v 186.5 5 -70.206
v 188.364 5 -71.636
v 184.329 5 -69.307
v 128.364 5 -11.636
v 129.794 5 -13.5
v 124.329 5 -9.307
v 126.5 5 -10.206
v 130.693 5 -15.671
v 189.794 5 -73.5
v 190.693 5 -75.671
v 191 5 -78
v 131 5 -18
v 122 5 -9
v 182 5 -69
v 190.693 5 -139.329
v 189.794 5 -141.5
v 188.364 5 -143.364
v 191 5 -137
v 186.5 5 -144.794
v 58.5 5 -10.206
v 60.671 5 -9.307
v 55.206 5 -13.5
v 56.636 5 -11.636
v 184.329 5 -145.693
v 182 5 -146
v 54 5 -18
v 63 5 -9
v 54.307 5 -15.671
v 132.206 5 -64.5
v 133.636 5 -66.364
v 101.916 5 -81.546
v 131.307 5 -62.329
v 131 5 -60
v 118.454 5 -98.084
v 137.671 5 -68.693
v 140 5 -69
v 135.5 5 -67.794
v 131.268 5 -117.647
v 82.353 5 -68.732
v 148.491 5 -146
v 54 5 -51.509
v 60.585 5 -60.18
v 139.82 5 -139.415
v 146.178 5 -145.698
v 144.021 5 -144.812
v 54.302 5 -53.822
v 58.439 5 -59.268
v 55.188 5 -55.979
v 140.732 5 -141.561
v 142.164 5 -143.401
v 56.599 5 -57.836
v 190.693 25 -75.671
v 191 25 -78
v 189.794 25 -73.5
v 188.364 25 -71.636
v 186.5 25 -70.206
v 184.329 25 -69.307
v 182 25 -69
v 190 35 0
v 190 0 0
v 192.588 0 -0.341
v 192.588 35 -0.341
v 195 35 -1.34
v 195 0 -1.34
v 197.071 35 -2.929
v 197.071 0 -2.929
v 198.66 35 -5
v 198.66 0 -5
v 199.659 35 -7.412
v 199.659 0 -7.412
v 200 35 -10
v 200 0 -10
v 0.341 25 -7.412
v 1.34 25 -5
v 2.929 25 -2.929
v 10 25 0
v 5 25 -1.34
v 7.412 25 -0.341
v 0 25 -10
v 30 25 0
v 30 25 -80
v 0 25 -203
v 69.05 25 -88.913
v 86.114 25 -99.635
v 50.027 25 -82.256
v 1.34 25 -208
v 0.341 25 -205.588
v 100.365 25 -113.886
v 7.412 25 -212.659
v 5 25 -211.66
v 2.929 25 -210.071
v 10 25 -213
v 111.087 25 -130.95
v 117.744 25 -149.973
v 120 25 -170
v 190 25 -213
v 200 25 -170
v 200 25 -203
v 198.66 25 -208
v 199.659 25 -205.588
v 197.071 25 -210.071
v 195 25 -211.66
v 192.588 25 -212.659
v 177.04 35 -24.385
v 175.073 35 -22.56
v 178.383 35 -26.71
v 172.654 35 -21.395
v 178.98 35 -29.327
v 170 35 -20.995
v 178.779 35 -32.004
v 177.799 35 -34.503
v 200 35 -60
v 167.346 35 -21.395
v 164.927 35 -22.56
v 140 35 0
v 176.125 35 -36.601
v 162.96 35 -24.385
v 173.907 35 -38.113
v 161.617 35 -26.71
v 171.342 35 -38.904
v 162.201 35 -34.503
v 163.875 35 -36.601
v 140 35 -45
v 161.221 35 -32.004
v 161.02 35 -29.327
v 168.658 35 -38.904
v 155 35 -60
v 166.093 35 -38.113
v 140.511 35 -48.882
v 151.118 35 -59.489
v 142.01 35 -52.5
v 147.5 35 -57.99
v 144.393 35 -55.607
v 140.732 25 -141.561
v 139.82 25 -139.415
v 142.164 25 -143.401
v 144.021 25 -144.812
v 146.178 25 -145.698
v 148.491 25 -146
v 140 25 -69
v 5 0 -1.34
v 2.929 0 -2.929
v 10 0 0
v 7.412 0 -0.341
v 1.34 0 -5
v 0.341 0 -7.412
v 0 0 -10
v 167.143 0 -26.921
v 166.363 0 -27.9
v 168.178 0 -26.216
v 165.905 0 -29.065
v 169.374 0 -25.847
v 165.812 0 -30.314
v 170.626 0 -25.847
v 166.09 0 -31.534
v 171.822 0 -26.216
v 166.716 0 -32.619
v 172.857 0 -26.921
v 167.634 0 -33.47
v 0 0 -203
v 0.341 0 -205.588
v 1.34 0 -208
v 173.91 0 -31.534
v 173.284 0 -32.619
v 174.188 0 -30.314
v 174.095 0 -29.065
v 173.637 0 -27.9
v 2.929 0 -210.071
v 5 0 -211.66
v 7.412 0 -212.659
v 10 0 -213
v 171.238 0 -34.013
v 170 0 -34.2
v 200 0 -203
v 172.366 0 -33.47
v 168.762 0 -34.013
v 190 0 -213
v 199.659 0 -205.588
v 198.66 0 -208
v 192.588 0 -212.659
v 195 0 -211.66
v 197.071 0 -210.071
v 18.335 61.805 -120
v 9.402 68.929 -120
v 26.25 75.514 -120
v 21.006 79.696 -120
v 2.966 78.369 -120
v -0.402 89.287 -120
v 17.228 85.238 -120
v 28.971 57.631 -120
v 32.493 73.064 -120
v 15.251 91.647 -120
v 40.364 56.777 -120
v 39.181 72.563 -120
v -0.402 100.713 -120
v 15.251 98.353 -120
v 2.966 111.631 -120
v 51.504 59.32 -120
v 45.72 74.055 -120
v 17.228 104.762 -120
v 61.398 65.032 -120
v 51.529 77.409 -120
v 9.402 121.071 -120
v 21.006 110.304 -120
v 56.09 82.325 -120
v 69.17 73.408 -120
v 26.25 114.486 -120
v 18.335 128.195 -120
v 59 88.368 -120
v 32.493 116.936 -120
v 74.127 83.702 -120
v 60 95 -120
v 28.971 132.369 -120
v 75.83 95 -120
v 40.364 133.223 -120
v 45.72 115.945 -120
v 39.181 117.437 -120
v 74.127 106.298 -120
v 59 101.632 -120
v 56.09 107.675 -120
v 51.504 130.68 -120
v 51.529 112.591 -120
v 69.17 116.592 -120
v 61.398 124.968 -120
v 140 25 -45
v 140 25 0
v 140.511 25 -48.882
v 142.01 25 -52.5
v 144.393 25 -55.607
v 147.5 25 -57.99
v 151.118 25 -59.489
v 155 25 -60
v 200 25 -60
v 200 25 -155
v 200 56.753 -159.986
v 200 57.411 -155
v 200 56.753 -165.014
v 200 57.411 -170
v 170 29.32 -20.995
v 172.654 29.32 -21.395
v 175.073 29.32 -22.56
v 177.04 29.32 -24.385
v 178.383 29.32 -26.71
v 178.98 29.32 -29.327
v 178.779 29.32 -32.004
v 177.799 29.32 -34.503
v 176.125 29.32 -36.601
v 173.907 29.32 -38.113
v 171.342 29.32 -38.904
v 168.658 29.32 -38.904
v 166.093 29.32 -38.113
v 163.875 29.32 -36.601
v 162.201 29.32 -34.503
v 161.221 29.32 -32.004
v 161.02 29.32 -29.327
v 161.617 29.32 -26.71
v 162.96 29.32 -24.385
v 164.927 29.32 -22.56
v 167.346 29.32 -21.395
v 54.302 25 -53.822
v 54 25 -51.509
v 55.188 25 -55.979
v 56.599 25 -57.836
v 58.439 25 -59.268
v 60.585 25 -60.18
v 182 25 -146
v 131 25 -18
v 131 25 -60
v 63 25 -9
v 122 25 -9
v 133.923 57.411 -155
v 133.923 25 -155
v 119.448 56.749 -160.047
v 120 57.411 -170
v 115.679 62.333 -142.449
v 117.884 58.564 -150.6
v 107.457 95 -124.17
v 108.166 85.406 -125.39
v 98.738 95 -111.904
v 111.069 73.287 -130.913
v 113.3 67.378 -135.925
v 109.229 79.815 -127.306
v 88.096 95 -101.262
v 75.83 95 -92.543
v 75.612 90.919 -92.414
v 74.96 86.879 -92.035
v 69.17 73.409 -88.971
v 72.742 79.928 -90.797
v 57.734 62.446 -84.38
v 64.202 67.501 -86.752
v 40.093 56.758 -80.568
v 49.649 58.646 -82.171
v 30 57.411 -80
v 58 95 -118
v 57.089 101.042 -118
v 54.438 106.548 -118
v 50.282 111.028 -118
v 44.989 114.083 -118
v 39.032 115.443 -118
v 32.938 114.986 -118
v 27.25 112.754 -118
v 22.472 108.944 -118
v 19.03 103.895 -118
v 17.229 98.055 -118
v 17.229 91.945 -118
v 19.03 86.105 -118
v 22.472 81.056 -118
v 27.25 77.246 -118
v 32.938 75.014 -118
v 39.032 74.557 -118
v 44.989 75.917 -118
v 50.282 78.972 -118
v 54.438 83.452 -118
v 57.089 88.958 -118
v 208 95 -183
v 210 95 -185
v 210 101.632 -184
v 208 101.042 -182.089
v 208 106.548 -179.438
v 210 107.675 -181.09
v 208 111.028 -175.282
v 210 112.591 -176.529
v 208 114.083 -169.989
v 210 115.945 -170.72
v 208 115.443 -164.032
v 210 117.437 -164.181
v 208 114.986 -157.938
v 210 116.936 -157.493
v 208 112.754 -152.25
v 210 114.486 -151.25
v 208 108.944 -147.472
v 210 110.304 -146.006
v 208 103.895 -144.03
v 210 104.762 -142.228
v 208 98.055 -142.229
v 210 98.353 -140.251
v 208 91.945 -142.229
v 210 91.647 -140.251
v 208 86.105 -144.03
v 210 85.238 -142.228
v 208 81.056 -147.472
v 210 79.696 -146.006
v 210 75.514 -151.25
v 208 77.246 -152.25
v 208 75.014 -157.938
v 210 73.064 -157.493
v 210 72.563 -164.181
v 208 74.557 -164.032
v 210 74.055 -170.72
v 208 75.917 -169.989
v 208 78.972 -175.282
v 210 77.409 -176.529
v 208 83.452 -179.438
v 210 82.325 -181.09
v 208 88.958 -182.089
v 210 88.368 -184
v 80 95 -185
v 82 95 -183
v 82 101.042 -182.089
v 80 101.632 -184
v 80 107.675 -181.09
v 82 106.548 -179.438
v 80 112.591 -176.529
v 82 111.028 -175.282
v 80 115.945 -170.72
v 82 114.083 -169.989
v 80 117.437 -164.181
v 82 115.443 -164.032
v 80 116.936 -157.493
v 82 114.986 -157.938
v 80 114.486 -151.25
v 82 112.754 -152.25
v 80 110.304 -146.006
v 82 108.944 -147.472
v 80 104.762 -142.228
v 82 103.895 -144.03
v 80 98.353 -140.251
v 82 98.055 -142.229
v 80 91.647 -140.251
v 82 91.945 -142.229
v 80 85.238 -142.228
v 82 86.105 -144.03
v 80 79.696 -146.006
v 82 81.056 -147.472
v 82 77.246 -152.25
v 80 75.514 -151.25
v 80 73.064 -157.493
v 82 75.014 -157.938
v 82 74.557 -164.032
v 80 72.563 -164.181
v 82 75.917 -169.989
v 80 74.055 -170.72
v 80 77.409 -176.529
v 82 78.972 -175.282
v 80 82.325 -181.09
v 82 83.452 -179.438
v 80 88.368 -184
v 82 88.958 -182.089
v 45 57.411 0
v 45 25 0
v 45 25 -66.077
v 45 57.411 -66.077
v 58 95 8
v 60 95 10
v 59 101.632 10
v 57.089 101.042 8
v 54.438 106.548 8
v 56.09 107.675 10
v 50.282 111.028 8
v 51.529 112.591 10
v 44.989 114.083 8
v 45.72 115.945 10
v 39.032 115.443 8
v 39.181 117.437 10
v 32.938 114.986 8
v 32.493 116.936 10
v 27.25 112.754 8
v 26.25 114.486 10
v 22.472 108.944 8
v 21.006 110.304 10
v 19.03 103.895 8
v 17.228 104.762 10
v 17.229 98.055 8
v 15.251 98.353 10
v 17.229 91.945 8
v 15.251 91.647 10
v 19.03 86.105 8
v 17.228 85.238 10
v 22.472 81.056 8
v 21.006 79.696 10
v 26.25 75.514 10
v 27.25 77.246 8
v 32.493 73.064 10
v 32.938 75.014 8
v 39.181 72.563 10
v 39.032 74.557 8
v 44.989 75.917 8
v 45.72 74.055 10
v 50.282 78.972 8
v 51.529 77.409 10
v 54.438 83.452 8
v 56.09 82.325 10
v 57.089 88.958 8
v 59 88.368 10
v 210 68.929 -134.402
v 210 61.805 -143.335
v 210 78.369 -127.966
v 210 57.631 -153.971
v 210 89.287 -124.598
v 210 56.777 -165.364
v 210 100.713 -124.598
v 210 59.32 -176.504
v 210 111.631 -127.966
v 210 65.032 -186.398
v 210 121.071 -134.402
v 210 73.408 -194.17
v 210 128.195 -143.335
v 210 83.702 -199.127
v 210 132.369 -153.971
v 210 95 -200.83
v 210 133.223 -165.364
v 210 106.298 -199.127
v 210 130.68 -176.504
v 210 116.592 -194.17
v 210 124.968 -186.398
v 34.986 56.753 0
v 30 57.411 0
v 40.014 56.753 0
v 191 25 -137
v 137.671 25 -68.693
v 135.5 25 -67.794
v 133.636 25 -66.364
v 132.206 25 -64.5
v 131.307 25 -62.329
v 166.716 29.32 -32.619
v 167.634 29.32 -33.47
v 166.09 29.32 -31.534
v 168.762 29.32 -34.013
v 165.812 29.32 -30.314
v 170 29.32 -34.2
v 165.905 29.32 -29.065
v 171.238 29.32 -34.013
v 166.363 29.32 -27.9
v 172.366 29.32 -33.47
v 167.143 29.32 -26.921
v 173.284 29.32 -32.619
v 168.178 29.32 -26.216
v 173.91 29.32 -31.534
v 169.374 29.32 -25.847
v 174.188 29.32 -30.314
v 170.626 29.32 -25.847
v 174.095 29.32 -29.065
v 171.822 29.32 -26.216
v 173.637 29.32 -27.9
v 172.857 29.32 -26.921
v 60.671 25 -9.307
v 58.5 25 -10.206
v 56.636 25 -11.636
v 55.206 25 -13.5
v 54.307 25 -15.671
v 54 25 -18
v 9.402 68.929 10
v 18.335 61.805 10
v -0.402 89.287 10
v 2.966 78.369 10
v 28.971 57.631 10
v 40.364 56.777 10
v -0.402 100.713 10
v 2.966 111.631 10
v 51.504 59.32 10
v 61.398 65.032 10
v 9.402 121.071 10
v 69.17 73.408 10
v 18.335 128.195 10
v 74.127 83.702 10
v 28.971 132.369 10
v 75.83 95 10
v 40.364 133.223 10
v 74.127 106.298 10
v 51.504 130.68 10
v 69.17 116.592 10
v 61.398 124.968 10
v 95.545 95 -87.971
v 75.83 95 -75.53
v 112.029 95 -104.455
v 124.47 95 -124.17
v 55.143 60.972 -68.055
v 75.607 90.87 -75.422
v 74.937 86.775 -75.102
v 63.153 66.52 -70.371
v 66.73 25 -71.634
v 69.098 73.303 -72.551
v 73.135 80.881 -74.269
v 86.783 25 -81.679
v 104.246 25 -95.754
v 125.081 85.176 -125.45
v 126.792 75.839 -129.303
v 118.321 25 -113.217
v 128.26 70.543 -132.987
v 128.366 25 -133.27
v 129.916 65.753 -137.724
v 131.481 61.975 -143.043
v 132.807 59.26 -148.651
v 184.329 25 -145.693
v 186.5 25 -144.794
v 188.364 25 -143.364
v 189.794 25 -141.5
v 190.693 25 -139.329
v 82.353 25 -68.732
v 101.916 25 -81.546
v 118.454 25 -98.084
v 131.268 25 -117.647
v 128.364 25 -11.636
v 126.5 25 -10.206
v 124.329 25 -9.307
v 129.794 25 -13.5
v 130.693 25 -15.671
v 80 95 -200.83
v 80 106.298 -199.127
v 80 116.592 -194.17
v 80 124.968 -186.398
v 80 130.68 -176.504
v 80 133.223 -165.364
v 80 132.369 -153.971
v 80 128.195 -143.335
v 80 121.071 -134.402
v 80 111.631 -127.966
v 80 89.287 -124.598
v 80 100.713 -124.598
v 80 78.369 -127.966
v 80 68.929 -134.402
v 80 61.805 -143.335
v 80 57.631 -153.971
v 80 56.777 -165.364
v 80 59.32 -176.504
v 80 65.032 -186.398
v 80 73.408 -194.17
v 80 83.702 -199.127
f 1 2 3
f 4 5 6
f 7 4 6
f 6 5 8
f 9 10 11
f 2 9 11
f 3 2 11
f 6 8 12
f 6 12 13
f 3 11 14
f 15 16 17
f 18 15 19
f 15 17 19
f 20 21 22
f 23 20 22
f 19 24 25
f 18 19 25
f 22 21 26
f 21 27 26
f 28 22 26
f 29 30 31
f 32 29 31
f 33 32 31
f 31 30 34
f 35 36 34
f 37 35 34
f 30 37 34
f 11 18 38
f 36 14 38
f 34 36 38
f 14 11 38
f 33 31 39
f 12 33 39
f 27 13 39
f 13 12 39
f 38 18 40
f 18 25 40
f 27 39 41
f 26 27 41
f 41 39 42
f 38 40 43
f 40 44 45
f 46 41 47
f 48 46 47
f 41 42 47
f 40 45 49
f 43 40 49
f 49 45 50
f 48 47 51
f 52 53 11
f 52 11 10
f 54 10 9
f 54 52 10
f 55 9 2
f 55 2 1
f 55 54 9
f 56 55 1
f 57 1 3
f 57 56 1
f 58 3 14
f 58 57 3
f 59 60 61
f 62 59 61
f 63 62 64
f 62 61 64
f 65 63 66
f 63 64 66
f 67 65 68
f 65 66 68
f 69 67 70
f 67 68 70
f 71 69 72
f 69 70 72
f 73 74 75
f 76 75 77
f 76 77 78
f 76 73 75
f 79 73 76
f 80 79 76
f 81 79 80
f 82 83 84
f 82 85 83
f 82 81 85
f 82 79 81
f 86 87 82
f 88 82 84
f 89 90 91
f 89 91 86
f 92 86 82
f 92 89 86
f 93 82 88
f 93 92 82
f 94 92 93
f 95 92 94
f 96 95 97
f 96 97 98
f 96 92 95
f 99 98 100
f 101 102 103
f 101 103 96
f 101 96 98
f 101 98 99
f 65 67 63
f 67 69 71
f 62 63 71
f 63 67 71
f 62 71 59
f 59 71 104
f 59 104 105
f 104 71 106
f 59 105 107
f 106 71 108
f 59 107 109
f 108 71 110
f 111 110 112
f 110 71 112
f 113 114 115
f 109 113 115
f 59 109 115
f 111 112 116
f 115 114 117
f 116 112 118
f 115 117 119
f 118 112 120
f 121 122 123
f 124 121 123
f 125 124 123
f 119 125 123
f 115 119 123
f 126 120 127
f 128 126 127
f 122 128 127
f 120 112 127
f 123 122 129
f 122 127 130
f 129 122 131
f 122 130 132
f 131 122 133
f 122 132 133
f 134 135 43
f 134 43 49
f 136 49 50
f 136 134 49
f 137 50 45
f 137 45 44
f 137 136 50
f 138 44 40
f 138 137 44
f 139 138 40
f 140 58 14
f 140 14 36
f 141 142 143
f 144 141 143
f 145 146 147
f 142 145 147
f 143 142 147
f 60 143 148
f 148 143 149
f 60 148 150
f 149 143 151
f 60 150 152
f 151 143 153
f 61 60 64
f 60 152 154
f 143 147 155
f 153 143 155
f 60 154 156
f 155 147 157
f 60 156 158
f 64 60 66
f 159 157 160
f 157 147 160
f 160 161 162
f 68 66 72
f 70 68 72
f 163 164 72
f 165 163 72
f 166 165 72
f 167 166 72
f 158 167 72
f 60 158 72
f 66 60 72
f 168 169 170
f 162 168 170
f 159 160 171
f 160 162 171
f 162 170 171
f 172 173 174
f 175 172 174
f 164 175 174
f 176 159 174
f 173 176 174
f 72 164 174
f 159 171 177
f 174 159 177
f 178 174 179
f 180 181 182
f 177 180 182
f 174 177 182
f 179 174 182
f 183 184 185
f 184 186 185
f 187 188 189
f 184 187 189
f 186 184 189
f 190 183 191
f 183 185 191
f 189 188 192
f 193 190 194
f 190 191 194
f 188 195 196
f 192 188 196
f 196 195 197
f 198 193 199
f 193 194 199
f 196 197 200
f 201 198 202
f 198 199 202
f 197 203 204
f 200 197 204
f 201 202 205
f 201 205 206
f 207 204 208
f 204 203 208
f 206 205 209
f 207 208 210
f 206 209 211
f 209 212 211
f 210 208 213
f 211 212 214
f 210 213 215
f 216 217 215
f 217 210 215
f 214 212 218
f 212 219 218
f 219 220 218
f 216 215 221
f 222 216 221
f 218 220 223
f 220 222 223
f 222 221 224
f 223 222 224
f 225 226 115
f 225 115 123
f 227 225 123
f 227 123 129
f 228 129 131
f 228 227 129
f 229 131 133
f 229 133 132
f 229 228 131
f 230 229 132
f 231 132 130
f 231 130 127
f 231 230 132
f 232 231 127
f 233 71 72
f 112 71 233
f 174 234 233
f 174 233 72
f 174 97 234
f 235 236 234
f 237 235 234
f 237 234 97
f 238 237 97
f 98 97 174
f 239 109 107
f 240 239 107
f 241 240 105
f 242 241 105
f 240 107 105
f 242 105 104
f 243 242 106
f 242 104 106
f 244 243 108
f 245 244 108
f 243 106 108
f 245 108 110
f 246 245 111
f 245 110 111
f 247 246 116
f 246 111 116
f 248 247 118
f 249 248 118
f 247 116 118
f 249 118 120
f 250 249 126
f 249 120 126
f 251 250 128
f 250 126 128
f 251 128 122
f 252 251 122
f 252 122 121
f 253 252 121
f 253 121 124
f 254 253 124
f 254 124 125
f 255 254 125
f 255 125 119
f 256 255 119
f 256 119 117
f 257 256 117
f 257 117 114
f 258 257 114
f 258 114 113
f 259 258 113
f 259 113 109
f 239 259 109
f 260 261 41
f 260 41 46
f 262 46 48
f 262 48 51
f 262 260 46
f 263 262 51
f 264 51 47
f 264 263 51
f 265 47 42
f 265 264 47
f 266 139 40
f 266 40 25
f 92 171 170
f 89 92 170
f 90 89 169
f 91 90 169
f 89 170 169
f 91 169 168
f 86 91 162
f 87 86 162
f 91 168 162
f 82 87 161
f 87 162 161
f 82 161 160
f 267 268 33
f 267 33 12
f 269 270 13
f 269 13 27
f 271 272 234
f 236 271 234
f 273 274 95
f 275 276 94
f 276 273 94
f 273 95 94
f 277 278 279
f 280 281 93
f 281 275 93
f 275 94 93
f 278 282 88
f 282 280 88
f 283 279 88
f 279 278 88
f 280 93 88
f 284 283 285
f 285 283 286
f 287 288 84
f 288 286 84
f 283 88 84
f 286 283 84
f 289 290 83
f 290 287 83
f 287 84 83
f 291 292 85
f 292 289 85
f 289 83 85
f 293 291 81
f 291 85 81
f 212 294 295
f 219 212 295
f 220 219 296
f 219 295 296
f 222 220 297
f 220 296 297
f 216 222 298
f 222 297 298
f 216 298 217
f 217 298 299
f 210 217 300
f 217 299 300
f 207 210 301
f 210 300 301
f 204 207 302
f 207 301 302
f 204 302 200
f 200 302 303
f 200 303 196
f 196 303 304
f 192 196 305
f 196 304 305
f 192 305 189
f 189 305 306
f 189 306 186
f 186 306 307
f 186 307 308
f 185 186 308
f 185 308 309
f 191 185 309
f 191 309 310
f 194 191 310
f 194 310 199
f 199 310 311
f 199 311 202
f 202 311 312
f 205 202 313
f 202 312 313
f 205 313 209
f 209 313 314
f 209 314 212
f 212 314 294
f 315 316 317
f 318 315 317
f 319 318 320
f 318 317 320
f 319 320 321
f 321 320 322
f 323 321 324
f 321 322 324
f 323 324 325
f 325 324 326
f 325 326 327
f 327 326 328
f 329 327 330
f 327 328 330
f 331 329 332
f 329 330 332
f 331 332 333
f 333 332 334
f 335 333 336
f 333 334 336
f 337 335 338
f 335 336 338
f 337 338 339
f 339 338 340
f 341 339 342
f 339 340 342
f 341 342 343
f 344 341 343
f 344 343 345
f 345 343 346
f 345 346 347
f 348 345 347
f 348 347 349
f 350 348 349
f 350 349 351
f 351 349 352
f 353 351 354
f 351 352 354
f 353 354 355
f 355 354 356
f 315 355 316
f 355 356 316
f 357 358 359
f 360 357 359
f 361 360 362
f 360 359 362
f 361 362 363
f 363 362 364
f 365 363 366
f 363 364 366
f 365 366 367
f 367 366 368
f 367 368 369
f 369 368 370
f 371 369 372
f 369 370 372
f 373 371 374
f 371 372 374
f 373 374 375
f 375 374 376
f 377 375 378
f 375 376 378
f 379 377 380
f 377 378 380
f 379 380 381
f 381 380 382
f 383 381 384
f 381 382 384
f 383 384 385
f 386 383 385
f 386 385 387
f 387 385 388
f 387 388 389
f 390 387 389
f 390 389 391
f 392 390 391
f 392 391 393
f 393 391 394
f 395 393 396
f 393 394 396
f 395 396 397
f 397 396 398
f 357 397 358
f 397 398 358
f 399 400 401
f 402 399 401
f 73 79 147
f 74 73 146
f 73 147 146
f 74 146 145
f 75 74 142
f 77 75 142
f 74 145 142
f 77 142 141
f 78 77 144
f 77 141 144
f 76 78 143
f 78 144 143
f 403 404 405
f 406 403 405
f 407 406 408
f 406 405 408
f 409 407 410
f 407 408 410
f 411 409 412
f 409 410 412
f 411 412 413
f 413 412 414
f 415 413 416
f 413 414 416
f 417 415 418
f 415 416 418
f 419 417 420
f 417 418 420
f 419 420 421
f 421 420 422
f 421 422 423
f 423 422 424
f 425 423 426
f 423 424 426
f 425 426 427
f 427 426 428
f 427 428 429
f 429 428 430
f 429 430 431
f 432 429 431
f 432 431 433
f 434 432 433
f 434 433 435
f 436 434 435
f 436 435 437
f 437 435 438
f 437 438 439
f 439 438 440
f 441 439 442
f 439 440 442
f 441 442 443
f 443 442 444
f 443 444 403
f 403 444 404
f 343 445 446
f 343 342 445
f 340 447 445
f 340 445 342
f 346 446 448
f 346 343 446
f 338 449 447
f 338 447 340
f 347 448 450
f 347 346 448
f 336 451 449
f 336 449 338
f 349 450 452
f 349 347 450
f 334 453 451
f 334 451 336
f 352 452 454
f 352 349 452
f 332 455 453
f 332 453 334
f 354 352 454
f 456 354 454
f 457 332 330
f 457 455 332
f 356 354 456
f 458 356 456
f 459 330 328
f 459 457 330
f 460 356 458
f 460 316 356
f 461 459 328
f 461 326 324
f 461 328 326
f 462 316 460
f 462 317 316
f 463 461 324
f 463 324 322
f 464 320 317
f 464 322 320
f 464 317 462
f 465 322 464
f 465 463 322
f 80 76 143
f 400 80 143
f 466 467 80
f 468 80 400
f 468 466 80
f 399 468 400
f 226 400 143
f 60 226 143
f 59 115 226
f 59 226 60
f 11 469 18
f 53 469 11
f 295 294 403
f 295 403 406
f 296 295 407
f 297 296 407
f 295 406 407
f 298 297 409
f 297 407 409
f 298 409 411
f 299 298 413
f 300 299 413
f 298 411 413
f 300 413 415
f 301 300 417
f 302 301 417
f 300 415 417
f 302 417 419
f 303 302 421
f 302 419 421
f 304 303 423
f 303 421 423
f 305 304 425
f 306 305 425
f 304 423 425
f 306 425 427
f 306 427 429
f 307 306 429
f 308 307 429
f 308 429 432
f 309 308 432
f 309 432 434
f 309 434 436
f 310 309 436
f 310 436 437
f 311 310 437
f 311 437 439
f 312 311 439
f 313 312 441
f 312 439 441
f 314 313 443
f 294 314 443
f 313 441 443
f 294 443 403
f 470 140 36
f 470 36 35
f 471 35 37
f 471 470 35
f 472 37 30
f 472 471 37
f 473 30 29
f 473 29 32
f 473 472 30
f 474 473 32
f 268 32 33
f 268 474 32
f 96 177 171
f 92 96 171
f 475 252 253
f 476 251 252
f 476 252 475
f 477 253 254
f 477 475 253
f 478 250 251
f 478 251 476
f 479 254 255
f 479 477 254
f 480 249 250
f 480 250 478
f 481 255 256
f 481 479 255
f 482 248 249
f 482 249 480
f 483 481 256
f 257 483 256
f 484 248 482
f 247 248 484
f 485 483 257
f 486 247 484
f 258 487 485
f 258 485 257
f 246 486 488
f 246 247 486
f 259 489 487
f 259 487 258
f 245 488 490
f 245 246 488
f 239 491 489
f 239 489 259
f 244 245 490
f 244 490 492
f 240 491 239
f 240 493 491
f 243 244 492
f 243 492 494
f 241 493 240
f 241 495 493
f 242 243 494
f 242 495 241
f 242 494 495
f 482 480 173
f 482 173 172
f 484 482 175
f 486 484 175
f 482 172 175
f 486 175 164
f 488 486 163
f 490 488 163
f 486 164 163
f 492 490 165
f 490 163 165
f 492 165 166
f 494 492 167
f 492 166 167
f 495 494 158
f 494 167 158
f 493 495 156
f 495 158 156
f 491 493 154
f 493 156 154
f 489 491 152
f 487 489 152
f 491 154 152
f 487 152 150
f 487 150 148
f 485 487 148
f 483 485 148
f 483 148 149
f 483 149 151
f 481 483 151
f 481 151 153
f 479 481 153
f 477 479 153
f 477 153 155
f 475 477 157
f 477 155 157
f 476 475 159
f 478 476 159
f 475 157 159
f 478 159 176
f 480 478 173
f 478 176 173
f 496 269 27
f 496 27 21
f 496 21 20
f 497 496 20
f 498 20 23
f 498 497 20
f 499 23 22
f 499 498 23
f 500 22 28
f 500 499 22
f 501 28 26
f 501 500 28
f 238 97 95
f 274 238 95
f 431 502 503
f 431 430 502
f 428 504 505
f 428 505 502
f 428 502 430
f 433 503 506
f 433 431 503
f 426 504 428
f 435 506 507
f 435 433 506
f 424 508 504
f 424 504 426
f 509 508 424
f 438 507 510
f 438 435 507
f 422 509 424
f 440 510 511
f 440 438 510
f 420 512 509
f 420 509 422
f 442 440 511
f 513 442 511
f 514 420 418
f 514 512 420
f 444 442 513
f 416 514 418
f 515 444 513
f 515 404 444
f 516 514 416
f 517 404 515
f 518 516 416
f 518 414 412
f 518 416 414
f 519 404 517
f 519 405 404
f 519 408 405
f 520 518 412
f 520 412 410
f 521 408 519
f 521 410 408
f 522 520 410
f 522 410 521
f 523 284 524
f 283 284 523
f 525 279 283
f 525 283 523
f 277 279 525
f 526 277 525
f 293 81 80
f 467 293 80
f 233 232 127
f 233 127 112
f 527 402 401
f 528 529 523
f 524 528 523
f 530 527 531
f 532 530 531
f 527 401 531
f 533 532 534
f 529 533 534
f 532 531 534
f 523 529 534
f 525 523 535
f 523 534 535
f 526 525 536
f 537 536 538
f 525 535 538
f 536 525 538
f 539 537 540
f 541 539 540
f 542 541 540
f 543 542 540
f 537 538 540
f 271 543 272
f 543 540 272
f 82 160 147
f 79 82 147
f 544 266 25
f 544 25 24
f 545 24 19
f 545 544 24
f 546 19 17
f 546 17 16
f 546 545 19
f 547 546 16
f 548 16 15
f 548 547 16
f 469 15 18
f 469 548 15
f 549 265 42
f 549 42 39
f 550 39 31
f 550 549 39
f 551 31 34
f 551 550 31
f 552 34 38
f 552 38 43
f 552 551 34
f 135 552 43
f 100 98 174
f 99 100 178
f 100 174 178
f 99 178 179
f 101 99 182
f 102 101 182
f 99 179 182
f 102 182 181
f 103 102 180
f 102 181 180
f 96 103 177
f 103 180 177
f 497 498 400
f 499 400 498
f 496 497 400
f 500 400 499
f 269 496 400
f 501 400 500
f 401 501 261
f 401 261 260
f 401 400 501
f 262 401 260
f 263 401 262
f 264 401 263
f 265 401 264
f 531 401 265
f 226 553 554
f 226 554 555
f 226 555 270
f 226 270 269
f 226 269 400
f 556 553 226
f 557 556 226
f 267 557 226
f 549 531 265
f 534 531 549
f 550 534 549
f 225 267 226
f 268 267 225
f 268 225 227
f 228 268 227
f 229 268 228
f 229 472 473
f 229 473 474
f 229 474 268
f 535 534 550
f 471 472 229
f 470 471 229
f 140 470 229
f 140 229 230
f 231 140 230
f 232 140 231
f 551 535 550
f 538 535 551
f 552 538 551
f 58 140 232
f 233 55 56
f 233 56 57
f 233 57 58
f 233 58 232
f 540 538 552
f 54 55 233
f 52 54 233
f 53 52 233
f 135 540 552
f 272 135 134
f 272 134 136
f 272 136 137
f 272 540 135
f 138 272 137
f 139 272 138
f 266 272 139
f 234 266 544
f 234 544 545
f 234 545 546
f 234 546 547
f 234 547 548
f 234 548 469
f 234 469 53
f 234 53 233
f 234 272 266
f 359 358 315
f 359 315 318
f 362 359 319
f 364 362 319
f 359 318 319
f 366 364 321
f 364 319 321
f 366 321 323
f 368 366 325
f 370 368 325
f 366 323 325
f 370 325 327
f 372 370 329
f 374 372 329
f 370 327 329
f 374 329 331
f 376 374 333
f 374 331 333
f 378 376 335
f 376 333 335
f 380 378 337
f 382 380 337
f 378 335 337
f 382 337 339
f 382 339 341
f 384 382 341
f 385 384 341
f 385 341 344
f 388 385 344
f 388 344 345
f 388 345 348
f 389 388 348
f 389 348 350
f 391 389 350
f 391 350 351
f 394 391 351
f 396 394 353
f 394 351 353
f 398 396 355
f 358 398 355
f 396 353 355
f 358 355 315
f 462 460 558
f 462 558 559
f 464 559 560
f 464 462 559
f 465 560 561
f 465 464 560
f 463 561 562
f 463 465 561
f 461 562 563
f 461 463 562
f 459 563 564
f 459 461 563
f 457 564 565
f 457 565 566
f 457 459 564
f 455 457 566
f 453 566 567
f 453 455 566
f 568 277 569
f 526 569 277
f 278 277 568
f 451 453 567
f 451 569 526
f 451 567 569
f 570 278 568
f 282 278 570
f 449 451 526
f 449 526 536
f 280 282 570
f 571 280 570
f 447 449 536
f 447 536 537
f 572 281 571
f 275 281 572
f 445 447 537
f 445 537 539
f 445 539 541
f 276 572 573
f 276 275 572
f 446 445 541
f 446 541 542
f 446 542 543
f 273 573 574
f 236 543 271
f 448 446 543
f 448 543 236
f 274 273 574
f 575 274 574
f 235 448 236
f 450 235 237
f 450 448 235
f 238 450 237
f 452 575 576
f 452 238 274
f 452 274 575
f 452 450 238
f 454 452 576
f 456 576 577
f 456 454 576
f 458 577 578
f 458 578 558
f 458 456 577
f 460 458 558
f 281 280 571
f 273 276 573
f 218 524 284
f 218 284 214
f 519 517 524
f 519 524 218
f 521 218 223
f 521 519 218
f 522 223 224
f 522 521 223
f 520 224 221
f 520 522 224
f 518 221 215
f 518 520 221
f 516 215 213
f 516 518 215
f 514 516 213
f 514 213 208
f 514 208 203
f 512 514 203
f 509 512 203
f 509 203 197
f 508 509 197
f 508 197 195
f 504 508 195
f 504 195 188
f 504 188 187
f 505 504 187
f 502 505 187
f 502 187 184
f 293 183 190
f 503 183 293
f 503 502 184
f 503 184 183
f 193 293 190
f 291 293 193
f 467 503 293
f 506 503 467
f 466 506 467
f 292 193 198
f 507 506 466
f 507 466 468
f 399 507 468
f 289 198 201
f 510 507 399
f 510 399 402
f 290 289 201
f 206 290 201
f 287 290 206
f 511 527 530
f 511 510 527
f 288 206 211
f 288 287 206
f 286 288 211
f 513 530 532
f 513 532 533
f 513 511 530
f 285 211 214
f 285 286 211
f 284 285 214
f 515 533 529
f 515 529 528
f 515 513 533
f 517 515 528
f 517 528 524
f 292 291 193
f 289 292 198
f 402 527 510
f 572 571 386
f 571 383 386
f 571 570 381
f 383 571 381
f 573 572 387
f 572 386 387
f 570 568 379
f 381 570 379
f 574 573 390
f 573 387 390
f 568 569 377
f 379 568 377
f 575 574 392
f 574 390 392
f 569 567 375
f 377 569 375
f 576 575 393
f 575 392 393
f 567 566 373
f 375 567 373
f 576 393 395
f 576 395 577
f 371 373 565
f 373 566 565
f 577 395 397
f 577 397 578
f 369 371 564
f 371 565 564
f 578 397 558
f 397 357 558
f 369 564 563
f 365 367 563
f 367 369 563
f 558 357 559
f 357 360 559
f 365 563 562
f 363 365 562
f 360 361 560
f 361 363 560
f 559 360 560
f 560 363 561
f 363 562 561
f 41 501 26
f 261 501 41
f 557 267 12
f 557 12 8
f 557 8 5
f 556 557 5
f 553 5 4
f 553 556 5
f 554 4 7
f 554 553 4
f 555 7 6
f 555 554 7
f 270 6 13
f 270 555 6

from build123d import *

# Parameters (mm, degrees)
BOSS_EXTRUDE1_DEPTH                     = 25
BOSS_EXTRUDE2_START                     = -25
BOSS_EXTRUDE2_DEPTH                     = 35
CBORE_FOR_M8_HEX_HEAD_BOLT2_D           = 8.4
CBORE_FOR_M8_HEX_HEAD_BOLT2_CBORE_D     = 18.01
CBORE_FOR_M8_HEX_HEAD_BOLT2_CBORE_DEPTH = 5.68
CUT_EXTRUDE1_DEPTH                      = 20
BOSS_EXTRUDE3_START                     = -25
BOSS_EXTRUDE3_DEPTH                     = 95
SKETCH10_R                              = 38.33
SKETCH10_R_2                            = 20.5
BOSS_EXTRUDE4_DEPTH                     = 120
CUT_EXTRUDE2_DEPTH                      = 130
SKETCH12_R                              = 38.33
SKETCH12_R_2                            = 20.5
BOSS_EXTRUDE5_DEPTH                     = 120
CUT_EXTRUDE3_DEPTH                      = 130
BOSS_EXTRUDE6_START                     = 10
SKETCH10_2_R                            = 38.33
SKETCH10_2_R_2                          = 20.5
BOSS_EXTRUDE6_DEPTH                     = 10
BOSS_EXTRUDE7_START                     = 10
SKETCH12_3_R                            = 38.33
SKETCH12_3_R_2                          = 20.5
BOSS_EXTRUDE7_DEPTH                     = 10
CHAMFER1_SIZE                           = 2


with BuildPart() as part:
    # Sketch1 → Boss-Extrude1 (new body)
    with BuildSketch(Plane(origin=(0, 0, 0), x_dir=(1, 0, 0), z_dir=(0, 1, 0))):
        with BuildLine():
            Line((10, 0), (190, 0))
            ThreePointArc((190, 0), (197.071067812, 2.928932188), (200, 10))
            Line((200, 10), (200, 203))
            ThreePointArc((200, 203), (197.071067812, 210.071067812), (190, 213))
            Line((190, 213), (10, 213))
            ThreePointArc((10, 213), (2.928932188, 210.071067812), (0, 203))
            Line((0, 203), (0, 10))
            ThreePointArc((0, 10), (2.928932188, 2.928932188), (10, 0))
        make_face()
    extrude(amount=BOSS_EXTRUDE1_DEPTH)

    # Sketch2 → Boss-Extrude2 (add)
    with BuildSketch(Plane(origin=(0, 25, 0), x_dir=(1, 0, 0), z_dir=(0, 1, 0)).offset(BOSS_EXTRUDE2_START)):
        with BuildLine():
            Line((155, 60), (200, 60))
            Line((200, 60), (200, 10))
            ThreePointArc((200, 10), (197.071067812, 2.928932188), (190, 0))
            Line((190, 0), (140, 0))
            Line((140, 0), (140, 45))
            ThreePointArc((140, 45), (144.393398282, 55.606601718), (155, 60))
        make_face()
    extrude(amount=BOSS_EXTRUDE2_DEPTH)

    # CBORE for M8 Hex Head Bolt2 (through all)
    with Locations(Plane(origin=(170, 35, -30), x_dir=(0, 0, 1), z_dir=(0, 1, 0))):
        with Locations((0, 0)):
            CounterBoreHole(CBORE_FOR_M8_HEX_HEAD_BOLT2_D / 2, CBORE_FOR_M8_HEX_HEAD_BOLT2_CBORE_D / 2, CBORE_FOR_M8_HEX_HEAD_BOLT2_CBORE_DEPTH)

    # Sketch9 → Cut-Extrude1 (cut)
    with BuildSketch(Plane(origin=(0, 25, 0), x_dir=(1, 0, 0), z_dir=(0, 1, 0))):
        with BuildLine():
            ThreePointArc((54, 51.509494051), (55.833002466, 56.953219461), (60.585365854, 60.179531072))
            ThreePointArc((60.585365854, 60.179531072), (110.610173055, 89.389826945), (139.820468928, 139.414634146))
            ThreePointArc((139.820468928, 139.414634146), (143.046780539, 144.166997534), (148.490505949, 146))
            Line((148.490505949, 146), (182, 146))
            ThreePointArc((182, 146), (188.363961031, 143.363961031), (191, 137))
            Line((191, 137), (191, 78))
            ThreePointArc((191, 78), (188.363961031, 71.636038969), (182, 69))
            Line((182, 69), (140, 69))
            ThreePointArc((140, 69), (133.636038969, 66.363961031), (131, 60))
            Line((131, 60), (131, 18))
            ThreePointArc((131, 18), (128.363961031, 11.636038969), (122, 9))
            Line((122, 9), (63, 9))
            ThreePointArc((63, 9), (56.636038969, 11.636038969), (54, 18))
            Line((54, 18), (54, 51.509494051))
        make_face()
    extrude(amount=-CUT_EXTRUDE1_DEPTH, mode=Mode.SUBTRACT)

    # Sketch9<3> → Boss-Extrude3 (add)
    with BuildSketch(Plane(origin=(0, 25, 0), x_dir=(1, 0, 0), z_dir=(0, 1, 0)).offset(BOSS_EXTRUDE3_START)):
        with BuildLine():
            Line((200, 155), (200, 170))
            Line((200, 170), (120, 170))
            ThreePointArc((120, 170), (93.639610307, 106.360389693), (30, 80))
            Line((30, 80), (30, 0))
            Line((30, 0), (45, 0))
            Line((45, 0), (45, 66.076951546))
            ThreePointArc((45, 66.076951546), (104.246212025, 95.753787975), (133.923048454, 155))
            Line((133.923048454, 155), (200, 155))
        make_face()
    extrude(amount=BOSS_EXTRUDE3_DEPTH)

    # Sketch10 → Boss-Extrude4 (add)
    with BuildSketch(Plane(origin=(200, 0, 0), x_dir=(0, 0, -1), z_dir=(1, 0, 0))):
        with Locations((162.5, 95)):
            Circle(SKETCH10_R)
        with Locations((162.5, 95)):
            Circle(SKETCH10_R_2, mode=Mode.SUBTRACT)
    extrude(amount=-BOSS_EXTRUDE4_DEPTH)

    # Sketch11 → Cut-Extrude2 (cut)
    with BuildSketch(Plane(origin=(200, 0, 0), x_dir=(0, 0, -1), z_dir=(1, 0, 0))):
        with BuildLine():
            Line((142, 95), (170, 95))
            Line((170, 95), (170, 75.921215972))
            ThreePointArc((170, 75.921215972), (150.956603619, 78.058925654), (142, 95))
        make_face()
    extrude(amount=-CUT_EXTRUDE2_DEPTH, mode=Mode.SUBTRACT)

    # Sketch12 → Boss-Extrude5 (add)
    with BuildSketch(Plane.XY):
        with Locations((37.5, 95)):
            Circle(SKETCH12_R)
        with Locations((37.5, 95)):
            Circle(SKETCH12_R_2, mode=Mode.SUBTRACT)
    extrude(amount=-BOSS_EXTRUDE5_DEPTH)

    # Sketch13 → Cut-Extrude3 (cut)
    with BuildSketch(Plane.XY):
        with BuildLine():
            Line((25.688032589, 78.245077563), (25.688032589, 100.102181985))
            Line((25.688032589, 100.102181985), (51.572180065, 100.102181985))
            Line((51.572180065, 100.102181985), (58, 95))
            ThreePointArc((58, 95), (46.936754423, 76.80116306), (25.688032589, 78.245077563))
        make_face()
    extrude(amount=-CUT_EXTRUDE3_DEPTH, mode=Mode.SUBTRACT)

    # Sketch10<2> → Boss-Extrude6 (add)
    with BuildSketch(Plane(origin=(200, 0, 0), x_dir=(0, 0, -1), z_dir=(1, 0, 0)).offset(BOSS_EXTRUDE6_START)):
        with Locations((162.5, 95)):
            Circle(SKETCH10_2_R)
        with Locations((162.5, 95)):
            Circle(SKETCH10_2_R_2, mode=Mode.SUBTRACT)
    extrude(amount=-BOSS_EXTRUDE6_DEPTH)

    # Sketch12<3> → Boss-Extrude7 (add)
    with BuildSketch(Plane.XY.offset(BOSS_EXTRUDE7_START)):
        with Locations((37.5, 95)):
            Circle(SKETCH12_3_R)
        with Locations((37.5, 95)):
            Circle(SKETCH12_3_R_2, mode=Mode.SUBTRACT)
    extrude(amount=-BOSS_EXTRUDE7_DEPTH)

    # Chamfer1
    chamfer1_edges = [part.edges().sort_by_distance(p)[0] for p in [
        (80, 95, -142),
        (17, 95, -120),
        (210, 95, -142),
        (17, 95, 10),
    ]]
    chamfer(chamfer1_edges, length=CHAMFER1_SIZE)


solid = part.part
